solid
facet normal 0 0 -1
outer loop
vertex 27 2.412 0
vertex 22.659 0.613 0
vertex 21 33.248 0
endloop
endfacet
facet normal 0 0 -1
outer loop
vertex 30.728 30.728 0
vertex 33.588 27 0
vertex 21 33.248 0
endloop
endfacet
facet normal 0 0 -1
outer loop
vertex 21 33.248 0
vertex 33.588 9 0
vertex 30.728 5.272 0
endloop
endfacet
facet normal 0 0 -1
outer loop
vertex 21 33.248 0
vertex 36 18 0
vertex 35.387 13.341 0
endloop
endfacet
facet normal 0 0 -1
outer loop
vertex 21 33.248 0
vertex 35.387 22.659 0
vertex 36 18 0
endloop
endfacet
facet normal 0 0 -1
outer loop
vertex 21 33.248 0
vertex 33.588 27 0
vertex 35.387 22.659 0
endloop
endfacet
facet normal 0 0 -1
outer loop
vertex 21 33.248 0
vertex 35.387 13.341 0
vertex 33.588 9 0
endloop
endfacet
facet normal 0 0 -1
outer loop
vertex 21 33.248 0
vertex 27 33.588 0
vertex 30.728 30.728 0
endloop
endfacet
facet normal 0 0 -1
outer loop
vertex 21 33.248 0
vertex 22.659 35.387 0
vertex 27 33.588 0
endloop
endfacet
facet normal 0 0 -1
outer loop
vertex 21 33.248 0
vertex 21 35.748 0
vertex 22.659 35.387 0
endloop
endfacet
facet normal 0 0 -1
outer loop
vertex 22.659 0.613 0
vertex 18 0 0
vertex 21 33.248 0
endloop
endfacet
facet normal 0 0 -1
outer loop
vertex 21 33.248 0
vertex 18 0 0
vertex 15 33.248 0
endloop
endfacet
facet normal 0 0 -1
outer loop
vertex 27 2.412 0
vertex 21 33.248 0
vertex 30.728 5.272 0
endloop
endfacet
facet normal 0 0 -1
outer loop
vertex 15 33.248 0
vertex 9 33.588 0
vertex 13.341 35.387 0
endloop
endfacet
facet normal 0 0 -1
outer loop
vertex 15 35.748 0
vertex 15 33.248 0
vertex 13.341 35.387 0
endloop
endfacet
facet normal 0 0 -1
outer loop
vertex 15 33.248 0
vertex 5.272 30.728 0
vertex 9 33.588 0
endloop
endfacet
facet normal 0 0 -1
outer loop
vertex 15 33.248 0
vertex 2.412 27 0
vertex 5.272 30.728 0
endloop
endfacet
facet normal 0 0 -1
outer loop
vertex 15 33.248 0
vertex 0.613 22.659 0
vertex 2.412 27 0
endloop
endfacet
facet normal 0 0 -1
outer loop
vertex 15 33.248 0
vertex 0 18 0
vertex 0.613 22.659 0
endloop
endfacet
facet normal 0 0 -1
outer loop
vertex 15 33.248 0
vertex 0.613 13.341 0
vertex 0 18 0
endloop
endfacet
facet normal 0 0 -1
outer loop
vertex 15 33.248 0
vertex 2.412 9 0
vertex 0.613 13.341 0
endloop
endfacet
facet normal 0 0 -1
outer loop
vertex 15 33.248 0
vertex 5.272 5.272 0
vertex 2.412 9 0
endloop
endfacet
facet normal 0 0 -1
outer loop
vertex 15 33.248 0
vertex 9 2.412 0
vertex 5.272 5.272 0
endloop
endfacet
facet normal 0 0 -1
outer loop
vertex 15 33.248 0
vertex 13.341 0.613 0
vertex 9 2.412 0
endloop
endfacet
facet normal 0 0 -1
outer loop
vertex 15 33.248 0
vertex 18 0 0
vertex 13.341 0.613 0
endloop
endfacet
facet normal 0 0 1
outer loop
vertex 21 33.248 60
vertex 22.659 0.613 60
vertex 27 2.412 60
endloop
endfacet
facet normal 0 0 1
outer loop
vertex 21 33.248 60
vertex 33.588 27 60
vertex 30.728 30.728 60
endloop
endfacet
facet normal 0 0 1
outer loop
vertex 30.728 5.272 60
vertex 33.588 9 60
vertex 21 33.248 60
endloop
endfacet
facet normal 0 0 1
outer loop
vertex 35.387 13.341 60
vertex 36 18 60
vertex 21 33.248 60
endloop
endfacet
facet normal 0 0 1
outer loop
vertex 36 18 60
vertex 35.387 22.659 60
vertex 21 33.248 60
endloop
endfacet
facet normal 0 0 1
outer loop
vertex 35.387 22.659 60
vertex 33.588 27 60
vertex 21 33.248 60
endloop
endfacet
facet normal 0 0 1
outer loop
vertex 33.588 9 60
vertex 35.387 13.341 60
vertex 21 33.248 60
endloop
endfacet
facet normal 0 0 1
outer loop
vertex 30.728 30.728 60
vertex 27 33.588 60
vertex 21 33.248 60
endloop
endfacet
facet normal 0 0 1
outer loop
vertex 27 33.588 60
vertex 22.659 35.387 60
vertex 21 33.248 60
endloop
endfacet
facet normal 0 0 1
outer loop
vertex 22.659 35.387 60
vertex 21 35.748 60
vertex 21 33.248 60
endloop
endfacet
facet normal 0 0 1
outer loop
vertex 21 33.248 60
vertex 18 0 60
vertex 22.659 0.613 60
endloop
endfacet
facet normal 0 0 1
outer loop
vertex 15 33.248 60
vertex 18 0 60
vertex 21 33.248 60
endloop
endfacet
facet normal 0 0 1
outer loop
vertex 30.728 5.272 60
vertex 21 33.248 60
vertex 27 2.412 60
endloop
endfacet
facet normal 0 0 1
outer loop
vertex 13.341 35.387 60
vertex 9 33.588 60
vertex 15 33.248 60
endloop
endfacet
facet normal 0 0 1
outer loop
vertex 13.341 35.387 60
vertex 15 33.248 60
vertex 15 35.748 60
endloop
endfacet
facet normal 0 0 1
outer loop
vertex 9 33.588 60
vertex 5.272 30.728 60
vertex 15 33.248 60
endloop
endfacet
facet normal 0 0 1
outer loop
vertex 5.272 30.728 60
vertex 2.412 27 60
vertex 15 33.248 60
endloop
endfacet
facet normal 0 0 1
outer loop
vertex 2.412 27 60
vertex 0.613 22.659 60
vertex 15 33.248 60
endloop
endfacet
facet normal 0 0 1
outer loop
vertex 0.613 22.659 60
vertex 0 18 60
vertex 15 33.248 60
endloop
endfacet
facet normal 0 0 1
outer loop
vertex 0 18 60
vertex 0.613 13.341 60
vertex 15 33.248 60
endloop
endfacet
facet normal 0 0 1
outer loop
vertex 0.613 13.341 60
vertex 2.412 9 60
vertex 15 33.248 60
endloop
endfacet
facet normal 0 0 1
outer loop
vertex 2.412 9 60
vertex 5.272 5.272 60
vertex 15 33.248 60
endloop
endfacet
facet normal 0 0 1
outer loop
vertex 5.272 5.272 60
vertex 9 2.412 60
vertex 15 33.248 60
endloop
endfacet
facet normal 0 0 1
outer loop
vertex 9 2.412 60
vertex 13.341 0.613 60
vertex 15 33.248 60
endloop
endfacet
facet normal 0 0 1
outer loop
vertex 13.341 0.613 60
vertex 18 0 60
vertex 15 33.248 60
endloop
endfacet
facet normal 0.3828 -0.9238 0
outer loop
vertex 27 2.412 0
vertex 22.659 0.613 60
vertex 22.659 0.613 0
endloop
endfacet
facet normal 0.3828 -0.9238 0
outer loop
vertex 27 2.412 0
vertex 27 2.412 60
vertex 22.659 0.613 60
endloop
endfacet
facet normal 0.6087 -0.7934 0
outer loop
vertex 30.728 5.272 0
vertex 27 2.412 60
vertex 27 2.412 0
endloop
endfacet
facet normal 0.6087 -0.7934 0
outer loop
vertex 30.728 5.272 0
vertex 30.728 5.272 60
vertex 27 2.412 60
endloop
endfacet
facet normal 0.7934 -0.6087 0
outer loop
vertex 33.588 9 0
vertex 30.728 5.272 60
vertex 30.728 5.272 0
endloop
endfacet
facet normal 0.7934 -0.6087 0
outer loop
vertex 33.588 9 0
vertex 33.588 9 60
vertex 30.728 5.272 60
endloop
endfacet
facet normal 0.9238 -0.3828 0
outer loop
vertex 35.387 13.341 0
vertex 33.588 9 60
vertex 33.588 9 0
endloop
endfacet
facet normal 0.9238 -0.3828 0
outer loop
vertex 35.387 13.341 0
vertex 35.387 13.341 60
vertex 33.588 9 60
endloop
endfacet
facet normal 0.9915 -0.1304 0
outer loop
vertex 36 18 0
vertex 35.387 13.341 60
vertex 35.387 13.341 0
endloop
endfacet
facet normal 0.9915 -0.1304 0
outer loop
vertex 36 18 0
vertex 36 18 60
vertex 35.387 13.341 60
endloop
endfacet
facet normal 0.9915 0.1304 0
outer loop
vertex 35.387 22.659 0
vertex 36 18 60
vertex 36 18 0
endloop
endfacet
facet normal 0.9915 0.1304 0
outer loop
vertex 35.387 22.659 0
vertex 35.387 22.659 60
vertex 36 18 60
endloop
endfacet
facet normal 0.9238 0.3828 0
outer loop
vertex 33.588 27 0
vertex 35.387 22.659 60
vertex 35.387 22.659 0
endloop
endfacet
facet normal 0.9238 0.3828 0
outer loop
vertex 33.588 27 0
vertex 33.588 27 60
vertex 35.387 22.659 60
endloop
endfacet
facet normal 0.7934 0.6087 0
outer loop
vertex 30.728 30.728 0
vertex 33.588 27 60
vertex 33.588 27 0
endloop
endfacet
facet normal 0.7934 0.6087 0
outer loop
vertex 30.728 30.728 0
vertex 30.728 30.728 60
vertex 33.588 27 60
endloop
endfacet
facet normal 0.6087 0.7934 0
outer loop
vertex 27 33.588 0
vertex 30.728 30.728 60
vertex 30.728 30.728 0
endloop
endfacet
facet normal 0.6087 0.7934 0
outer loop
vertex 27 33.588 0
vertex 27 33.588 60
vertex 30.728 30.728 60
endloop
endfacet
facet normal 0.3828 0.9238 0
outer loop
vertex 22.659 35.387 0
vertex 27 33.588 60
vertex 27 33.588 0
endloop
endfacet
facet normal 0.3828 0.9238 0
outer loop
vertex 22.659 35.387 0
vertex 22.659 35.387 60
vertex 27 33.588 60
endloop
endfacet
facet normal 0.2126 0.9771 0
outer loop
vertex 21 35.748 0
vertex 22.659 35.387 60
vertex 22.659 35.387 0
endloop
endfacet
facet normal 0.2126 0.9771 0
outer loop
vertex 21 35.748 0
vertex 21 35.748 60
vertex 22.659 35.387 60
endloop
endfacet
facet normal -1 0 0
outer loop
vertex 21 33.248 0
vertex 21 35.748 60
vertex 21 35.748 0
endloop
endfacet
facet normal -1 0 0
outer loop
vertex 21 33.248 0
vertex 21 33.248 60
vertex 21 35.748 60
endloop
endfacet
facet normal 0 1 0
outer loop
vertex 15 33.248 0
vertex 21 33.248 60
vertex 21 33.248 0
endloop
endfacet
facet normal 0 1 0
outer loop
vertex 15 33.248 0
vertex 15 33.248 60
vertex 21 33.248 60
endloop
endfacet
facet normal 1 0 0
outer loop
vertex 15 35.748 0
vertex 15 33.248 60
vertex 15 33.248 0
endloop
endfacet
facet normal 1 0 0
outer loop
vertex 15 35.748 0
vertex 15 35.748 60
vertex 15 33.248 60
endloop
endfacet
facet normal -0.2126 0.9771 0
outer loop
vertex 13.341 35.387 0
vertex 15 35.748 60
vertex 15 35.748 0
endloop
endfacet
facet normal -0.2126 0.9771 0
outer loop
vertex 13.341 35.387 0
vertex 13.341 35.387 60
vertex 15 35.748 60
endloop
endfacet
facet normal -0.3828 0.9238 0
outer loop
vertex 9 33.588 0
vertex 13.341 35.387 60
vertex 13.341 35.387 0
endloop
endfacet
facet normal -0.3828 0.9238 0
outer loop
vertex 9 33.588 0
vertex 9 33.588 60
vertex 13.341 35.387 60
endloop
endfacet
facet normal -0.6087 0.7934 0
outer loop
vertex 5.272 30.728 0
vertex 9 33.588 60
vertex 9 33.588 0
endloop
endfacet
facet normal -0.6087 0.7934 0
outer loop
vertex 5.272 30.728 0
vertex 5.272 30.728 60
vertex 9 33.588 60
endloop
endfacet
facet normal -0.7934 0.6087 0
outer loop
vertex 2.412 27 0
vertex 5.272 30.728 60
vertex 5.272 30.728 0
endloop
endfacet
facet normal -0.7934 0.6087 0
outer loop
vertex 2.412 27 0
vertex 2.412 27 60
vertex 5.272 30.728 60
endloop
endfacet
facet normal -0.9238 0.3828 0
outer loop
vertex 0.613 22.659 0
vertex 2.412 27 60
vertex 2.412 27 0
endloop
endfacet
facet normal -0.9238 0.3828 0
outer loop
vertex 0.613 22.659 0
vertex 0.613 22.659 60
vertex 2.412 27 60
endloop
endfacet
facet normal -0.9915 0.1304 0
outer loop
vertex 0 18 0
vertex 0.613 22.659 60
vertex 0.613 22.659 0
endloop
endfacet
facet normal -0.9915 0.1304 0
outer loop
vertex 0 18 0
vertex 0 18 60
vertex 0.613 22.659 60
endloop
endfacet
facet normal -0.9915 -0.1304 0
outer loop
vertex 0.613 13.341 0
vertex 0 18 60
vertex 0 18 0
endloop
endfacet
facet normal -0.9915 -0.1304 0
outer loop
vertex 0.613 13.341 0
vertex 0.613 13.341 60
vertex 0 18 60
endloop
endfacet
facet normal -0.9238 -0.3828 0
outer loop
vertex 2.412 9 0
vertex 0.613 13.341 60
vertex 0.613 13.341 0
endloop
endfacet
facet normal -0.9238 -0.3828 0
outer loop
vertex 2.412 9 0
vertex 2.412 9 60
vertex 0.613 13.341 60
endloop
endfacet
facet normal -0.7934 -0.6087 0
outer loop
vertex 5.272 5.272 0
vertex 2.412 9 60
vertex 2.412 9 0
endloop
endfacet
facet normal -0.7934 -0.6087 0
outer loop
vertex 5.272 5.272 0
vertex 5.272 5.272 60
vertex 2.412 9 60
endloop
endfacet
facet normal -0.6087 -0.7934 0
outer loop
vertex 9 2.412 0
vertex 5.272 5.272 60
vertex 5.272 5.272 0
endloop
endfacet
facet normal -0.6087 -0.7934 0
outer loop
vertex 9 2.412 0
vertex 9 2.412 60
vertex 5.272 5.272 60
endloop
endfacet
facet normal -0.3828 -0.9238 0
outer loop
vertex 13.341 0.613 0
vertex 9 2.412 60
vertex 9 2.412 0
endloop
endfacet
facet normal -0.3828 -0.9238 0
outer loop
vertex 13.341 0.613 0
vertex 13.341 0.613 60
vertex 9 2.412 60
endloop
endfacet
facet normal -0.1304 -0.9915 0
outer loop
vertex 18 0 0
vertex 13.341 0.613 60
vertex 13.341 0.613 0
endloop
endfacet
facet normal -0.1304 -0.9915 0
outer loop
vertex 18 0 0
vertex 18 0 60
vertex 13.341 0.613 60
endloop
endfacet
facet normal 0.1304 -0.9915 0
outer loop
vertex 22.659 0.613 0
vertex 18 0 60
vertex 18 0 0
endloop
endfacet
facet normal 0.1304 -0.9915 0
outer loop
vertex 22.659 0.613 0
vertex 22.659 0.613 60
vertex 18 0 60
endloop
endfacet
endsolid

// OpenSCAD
$fn = 32;

// ----------------------------------------------------------------------
// Keyway shaft: d36 shaft, key 6 x 2.5 mm
// ----------------------------------------------------------------------

// --- parameters (mm) ---
shaft_r = 18;             // shaft radius
key_w = 6;                // keyway width
key_d = 2.5;              // keyway depth below the surface line
plate_t = 60;             // shaft length, Z (extrusion height)
fit_tol = 0.05;           // declared fit tolerance (prompt contract)
free_tol = 0.3;           // declared free tolerance (prompt contract)

shaft_d = 2 * shaft_r;  // shaft diameter
circle_step = 15;  // polygon sampling step, degrees

profile = [[13.341, 35.387], [9, 33.588], [5.272, 30.728], [2.412, 27], [0.613, 22.659], [0, 18], [0.613, 13.341], [2.412, 9], [5.272, 5.272], [9, 2.412], [13.341, 0.613], [18, 0], [22.659, 0.613], [27, 2.412], [30.728, 5.272], [33.588, 9], [35.387, 13.341], [36, 18], [35.387, 22.659], [33.588, 27], [30.728, 30.728], [27, 33.588], [22.659, 35.387], [21, 35.748], [21, 33.248], [15, 33.248], [15, 35.748]];  // primary outline, 27 points, counter clockwise

// --- the one profile operation ---
linear_extrude(height = plate_t) polygon(points = profile);
